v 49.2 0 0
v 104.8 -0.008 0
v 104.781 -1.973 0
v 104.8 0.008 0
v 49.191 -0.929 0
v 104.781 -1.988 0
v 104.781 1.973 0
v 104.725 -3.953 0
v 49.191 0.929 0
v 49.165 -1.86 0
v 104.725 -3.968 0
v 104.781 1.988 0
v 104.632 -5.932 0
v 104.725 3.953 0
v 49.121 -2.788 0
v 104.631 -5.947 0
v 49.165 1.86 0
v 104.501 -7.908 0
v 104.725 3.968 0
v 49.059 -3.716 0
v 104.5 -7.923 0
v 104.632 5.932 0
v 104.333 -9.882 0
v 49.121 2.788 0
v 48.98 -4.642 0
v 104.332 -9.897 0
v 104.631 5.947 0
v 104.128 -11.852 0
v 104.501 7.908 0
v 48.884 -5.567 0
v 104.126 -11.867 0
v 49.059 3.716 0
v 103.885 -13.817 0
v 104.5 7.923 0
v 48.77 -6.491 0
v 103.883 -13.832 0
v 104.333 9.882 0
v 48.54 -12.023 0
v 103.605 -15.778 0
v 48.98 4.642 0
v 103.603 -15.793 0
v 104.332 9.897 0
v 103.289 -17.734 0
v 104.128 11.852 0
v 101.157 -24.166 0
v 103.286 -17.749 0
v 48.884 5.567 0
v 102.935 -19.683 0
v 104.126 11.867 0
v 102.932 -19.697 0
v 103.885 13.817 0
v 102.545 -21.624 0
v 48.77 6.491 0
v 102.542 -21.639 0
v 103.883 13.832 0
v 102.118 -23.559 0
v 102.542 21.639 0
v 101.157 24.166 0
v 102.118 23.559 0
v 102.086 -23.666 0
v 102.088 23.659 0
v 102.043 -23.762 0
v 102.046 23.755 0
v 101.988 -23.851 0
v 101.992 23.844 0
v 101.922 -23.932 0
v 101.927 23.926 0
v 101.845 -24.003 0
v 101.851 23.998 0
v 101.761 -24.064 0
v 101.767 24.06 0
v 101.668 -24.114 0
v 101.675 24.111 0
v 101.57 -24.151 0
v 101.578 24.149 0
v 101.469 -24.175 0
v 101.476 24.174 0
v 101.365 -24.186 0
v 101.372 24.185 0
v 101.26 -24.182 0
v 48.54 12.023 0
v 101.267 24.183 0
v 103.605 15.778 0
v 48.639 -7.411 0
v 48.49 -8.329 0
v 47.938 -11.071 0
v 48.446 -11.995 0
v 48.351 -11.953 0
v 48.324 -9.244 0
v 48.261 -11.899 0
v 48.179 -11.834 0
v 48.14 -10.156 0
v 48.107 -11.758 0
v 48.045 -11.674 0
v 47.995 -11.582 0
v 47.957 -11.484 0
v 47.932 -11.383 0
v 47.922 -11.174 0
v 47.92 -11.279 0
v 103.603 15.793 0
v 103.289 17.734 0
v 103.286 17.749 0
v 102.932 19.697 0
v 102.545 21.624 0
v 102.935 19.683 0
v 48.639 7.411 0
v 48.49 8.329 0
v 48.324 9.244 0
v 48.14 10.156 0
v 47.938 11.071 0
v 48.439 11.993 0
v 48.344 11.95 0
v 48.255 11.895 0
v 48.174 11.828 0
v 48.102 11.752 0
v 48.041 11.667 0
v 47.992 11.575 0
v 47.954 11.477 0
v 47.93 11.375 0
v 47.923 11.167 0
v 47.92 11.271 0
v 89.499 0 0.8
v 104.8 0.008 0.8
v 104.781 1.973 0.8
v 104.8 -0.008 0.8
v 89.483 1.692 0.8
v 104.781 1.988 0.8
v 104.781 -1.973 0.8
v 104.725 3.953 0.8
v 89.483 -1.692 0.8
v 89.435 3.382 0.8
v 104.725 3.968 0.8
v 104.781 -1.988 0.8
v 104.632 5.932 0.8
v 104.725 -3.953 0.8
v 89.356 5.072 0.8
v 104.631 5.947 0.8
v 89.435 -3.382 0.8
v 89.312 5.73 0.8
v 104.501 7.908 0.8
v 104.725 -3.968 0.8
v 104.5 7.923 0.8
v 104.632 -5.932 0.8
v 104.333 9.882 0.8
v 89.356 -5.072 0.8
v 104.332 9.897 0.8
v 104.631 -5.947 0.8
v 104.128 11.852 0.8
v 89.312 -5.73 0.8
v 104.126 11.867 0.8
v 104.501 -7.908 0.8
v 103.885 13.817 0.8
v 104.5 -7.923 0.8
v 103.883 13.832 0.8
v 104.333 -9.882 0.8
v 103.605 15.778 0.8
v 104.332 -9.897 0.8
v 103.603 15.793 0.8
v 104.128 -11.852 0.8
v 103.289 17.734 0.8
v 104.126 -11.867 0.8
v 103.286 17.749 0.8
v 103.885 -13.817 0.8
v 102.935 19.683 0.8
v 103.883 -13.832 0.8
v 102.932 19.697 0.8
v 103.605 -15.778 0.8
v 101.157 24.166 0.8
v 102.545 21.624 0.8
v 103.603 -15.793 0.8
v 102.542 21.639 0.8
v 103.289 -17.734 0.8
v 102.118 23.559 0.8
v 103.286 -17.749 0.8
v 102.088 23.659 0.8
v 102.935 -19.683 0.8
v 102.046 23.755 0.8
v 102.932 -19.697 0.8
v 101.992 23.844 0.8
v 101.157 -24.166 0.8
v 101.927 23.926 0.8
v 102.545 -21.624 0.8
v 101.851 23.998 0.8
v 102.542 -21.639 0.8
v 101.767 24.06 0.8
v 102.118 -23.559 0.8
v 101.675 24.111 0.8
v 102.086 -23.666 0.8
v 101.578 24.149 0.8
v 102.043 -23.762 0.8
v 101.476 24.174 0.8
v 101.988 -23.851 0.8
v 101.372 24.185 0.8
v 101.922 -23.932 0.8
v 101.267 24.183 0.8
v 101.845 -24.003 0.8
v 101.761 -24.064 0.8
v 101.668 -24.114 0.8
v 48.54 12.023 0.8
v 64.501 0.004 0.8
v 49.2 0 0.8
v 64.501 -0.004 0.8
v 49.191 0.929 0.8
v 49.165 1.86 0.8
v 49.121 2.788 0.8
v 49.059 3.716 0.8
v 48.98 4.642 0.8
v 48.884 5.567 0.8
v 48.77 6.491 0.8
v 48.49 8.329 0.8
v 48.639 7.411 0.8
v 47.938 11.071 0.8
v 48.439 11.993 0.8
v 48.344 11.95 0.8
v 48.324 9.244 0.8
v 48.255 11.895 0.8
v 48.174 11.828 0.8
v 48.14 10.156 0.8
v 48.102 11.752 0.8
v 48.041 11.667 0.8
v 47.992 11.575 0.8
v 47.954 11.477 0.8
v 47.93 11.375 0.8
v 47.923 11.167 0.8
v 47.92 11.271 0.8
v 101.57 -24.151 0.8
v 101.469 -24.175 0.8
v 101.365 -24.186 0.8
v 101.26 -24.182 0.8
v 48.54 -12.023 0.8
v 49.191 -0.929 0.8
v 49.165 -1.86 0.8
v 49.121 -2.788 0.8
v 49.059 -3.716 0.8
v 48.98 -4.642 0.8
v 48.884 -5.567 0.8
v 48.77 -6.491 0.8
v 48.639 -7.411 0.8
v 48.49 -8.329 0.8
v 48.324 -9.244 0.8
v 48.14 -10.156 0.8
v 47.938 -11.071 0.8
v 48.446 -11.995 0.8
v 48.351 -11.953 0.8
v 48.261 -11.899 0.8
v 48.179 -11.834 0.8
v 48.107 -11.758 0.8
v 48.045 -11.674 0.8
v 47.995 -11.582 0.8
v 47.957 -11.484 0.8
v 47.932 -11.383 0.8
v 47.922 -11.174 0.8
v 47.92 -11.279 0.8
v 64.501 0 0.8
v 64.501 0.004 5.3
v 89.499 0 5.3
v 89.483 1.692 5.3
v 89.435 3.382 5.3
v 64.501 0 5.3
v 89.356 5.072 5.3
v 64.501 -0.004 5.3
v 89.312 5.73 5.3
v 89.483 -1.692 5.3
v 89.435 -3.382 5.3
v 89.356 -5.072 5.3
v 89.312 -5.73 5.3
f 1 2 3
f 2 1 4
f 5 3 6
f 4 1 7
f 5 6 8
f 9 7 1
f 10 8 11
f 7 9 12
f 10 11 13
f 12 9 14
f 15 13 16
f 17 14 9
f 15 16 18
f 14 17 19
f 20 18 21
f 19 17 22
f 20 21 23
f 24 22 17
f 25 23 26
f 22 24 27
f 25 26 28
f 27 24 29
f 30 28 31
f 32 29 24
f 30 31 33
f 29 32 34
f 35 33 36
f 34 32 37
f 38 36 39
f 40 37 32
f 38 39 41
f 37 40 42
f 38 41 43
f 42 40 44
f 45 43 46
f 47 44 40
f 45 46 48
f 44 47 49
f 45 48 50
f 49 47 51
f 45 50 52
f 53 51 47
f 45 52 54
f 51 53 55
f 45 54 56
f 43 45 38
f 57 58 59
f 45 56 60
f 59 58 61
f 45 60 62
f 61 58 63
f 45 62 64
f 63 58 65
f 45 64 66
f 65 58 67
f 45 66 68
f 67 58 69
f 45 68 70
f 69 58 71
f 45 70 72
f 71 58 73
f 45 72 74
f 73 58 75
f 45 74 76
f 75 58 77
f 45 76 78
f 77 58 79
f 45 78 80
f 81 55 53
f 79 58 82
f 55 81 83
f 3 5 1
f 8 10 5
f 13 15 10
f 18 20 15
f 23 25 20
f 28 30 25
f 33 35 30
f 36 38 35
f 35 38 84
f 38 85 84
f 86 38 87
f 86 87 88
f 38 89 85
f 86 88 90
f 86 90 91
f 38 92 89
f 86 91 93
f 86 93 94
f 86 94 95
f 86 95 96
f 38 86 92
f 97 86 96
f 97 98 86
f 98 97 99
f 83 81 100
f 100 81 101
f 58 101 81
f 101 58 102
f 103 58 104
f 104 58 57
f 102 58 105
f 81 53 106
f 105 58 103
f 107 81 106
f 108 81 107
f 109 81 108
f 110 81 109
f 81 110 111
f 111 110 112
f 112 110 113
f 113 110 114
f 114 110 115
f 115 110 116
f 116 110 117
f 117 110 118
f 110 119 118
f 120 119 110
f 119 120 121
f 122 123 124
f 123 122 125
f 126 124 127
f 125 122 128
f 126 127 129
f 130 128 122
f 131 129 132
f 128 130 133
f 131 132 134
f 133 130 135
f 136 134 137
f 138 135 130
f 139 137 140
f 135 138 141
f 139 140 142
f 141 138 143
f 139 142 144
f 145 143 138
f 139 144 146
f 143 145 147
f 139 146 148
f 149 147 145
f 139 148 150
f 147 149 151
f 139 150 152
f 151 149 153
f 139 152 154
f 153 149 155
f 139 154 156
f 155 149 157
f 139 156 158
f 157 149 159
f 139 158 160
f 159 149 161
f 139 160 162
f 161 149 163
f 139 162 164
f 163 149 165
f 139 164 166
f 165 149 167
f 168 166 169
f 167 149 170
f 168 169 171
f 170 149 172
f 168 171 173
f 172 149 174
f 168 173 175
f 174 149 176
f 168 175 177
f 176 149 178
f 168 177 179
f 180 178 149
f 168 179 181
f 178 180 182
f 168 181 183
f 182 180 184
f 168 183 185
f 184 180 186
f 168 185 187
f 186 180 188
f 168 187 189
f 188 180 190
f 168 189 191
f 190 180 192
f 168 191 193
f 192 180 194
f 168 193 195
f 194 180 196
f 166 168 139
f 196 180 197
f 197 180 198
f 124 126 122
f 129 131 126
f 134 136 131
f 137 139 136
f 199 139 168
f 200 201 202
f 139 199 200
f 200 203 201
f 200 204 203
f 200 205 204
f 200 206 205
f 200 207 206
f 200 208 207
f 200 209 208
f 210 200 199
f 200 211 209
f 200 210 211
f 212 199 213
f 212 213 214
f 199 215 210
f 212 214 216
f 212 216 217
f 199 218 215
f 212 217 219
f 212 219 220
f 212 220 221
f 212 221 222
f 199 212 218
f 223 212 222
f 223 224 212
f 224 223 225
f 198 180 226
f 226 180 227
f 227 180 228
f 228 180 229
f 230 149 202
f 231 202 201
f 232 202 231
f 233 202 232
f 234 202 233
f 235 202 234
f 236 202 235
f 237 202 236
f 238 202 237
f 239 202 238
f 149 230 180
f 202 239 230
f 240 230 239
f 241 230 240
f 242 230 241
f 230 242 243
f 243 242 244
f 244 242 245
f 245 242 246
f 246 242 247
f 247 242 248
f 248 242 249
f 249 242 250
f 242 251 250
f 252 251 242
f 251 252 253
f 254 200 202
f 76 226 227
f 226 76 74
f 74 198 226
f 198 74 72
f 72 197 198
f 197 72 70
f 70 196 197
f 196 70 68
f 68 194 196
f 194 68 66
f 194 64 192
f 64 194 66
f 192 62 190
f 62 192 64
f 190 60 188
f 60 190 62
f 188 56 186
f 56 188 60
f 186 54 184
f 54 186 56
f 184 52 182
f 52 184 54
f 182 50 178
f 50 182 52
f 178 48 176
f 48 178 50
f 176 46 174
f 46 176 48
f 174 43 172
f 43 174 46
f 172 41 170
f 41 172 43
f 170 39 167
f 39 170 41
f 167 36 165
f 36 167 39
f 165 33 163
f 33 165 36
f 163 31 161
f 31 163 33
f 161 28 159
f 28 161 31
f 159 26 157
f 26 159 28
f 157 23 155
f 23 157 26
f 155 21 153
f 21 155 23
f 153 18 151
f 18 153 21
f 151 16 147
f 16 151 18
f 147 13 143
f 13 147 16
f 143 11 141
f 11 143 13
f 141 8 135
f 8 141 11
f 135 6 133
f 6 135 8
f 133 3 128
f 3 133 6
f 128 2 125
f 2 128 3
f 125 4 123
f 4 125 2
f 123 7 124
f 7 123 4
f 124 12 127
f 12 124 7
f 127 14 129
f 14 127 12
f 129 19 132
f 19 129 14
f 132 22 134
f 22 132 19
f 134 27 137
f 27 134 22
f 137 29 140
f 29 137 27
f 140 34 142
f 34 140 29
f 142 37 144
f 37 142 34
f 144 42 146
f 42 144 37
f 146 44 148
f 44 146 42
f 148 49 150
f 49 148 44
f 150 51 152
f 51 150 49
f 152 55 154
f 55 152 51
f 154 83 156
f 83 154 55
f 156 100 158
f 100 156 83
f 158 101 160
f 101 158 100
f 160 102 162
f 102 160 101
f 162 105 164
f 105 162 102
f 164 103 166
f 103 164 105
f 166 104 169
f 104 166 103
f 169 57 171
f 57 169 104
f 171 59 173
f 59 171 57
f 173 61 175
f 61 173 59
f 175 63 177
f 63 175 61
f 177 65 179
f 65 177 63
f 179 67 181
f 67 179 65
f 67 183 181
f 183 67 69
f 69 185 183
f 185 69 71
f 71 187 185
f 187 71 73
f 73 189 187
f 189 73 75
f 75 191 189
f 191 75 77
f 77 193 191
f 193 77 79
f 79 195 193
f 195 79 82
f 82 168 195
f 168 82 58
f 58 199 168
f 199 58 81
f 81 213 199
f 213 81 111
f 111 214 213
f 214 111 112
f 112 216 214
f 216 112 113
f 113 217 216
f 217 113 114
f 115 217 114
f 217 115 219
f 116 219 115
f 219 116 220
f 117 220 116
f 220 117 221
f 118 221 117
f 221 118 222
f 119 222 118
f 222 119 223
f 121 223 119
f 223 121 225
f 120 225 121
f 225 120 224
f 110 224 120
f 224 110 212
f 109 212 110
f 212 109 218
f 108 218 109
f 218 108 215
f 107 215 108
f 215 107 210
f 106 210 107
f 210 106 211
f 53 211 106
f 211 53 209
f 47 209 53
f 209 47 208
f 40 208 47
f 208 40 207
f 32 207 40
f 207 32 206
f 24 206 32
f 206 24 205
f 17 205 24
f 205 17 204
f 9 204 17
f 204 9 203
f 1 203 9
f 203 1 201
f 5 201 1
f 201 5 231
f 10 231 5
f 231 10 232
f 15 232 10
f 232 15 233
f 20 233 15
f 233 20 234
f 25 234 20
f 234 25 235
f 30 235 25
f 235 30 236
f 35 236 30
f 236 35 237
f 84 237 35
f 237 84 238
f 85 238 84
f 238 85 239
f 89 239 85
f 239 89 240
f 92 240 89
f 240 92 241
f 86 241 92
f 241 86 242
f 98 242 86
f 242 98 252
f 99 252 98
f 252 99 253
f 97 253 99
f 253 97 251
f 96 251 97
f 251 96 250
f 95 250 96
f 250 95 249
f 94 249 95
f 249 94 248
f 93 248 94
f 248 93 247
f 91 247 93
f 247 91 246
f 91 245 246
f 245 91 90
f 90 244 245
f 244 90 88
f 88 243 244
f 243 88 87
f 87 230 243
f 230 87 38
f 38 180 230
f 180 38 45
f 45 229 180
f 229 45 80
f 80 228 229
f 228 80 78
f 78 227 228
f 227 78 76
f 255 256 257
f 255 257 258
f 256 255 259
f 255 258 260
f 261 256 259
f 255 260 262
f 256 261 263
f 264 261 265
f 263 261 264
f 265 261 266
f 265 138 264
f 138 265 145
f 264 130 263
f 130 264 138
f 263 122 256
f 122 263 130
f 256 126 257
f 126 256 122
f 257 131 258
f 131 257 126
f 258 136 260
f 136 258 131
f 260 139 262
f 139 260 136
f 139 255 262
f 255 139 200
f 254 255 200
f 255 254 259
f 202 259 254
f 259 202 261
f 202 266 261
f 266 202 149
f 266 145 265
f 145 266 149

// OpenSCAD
// Gen-CJ — bobbin BASE (bottom flange + hub). Print x12, flange down. Wind 26 AWG x 266 t around
// the hub with the LID glued on (coil_lid.stl). Copper lives ONLY between the flanges (no proud winds).
include <parameters.scad>;
$fn = 48;
module sector_2d(r_in, r_out, ang) {
    polygon([
        for (a = [-ang/2 : ang/24 : ang/2]) [r_in*cos(a), r_in*sin(a)],
        for (a = [ang/2 : -ang/24 : -ang/2]) [r_out*cos(a), r_out*sin(a)]
    ]);
}
module footprint_2d() { offset(r=wall) sector_2d(coil_id_r, coil_od_r, span_deg); }
module hub_2d()       { offset(delta=-coil_core_inset) sector_2d(coil_id_r, coil_od_r, span_deg); }

union() {
    linear_extrude(flange_t) footprint_2d();
    translate([0, 0, flange_t - 0.01]) linear_extrude(former_web + 0.01) hub_2d();
}
